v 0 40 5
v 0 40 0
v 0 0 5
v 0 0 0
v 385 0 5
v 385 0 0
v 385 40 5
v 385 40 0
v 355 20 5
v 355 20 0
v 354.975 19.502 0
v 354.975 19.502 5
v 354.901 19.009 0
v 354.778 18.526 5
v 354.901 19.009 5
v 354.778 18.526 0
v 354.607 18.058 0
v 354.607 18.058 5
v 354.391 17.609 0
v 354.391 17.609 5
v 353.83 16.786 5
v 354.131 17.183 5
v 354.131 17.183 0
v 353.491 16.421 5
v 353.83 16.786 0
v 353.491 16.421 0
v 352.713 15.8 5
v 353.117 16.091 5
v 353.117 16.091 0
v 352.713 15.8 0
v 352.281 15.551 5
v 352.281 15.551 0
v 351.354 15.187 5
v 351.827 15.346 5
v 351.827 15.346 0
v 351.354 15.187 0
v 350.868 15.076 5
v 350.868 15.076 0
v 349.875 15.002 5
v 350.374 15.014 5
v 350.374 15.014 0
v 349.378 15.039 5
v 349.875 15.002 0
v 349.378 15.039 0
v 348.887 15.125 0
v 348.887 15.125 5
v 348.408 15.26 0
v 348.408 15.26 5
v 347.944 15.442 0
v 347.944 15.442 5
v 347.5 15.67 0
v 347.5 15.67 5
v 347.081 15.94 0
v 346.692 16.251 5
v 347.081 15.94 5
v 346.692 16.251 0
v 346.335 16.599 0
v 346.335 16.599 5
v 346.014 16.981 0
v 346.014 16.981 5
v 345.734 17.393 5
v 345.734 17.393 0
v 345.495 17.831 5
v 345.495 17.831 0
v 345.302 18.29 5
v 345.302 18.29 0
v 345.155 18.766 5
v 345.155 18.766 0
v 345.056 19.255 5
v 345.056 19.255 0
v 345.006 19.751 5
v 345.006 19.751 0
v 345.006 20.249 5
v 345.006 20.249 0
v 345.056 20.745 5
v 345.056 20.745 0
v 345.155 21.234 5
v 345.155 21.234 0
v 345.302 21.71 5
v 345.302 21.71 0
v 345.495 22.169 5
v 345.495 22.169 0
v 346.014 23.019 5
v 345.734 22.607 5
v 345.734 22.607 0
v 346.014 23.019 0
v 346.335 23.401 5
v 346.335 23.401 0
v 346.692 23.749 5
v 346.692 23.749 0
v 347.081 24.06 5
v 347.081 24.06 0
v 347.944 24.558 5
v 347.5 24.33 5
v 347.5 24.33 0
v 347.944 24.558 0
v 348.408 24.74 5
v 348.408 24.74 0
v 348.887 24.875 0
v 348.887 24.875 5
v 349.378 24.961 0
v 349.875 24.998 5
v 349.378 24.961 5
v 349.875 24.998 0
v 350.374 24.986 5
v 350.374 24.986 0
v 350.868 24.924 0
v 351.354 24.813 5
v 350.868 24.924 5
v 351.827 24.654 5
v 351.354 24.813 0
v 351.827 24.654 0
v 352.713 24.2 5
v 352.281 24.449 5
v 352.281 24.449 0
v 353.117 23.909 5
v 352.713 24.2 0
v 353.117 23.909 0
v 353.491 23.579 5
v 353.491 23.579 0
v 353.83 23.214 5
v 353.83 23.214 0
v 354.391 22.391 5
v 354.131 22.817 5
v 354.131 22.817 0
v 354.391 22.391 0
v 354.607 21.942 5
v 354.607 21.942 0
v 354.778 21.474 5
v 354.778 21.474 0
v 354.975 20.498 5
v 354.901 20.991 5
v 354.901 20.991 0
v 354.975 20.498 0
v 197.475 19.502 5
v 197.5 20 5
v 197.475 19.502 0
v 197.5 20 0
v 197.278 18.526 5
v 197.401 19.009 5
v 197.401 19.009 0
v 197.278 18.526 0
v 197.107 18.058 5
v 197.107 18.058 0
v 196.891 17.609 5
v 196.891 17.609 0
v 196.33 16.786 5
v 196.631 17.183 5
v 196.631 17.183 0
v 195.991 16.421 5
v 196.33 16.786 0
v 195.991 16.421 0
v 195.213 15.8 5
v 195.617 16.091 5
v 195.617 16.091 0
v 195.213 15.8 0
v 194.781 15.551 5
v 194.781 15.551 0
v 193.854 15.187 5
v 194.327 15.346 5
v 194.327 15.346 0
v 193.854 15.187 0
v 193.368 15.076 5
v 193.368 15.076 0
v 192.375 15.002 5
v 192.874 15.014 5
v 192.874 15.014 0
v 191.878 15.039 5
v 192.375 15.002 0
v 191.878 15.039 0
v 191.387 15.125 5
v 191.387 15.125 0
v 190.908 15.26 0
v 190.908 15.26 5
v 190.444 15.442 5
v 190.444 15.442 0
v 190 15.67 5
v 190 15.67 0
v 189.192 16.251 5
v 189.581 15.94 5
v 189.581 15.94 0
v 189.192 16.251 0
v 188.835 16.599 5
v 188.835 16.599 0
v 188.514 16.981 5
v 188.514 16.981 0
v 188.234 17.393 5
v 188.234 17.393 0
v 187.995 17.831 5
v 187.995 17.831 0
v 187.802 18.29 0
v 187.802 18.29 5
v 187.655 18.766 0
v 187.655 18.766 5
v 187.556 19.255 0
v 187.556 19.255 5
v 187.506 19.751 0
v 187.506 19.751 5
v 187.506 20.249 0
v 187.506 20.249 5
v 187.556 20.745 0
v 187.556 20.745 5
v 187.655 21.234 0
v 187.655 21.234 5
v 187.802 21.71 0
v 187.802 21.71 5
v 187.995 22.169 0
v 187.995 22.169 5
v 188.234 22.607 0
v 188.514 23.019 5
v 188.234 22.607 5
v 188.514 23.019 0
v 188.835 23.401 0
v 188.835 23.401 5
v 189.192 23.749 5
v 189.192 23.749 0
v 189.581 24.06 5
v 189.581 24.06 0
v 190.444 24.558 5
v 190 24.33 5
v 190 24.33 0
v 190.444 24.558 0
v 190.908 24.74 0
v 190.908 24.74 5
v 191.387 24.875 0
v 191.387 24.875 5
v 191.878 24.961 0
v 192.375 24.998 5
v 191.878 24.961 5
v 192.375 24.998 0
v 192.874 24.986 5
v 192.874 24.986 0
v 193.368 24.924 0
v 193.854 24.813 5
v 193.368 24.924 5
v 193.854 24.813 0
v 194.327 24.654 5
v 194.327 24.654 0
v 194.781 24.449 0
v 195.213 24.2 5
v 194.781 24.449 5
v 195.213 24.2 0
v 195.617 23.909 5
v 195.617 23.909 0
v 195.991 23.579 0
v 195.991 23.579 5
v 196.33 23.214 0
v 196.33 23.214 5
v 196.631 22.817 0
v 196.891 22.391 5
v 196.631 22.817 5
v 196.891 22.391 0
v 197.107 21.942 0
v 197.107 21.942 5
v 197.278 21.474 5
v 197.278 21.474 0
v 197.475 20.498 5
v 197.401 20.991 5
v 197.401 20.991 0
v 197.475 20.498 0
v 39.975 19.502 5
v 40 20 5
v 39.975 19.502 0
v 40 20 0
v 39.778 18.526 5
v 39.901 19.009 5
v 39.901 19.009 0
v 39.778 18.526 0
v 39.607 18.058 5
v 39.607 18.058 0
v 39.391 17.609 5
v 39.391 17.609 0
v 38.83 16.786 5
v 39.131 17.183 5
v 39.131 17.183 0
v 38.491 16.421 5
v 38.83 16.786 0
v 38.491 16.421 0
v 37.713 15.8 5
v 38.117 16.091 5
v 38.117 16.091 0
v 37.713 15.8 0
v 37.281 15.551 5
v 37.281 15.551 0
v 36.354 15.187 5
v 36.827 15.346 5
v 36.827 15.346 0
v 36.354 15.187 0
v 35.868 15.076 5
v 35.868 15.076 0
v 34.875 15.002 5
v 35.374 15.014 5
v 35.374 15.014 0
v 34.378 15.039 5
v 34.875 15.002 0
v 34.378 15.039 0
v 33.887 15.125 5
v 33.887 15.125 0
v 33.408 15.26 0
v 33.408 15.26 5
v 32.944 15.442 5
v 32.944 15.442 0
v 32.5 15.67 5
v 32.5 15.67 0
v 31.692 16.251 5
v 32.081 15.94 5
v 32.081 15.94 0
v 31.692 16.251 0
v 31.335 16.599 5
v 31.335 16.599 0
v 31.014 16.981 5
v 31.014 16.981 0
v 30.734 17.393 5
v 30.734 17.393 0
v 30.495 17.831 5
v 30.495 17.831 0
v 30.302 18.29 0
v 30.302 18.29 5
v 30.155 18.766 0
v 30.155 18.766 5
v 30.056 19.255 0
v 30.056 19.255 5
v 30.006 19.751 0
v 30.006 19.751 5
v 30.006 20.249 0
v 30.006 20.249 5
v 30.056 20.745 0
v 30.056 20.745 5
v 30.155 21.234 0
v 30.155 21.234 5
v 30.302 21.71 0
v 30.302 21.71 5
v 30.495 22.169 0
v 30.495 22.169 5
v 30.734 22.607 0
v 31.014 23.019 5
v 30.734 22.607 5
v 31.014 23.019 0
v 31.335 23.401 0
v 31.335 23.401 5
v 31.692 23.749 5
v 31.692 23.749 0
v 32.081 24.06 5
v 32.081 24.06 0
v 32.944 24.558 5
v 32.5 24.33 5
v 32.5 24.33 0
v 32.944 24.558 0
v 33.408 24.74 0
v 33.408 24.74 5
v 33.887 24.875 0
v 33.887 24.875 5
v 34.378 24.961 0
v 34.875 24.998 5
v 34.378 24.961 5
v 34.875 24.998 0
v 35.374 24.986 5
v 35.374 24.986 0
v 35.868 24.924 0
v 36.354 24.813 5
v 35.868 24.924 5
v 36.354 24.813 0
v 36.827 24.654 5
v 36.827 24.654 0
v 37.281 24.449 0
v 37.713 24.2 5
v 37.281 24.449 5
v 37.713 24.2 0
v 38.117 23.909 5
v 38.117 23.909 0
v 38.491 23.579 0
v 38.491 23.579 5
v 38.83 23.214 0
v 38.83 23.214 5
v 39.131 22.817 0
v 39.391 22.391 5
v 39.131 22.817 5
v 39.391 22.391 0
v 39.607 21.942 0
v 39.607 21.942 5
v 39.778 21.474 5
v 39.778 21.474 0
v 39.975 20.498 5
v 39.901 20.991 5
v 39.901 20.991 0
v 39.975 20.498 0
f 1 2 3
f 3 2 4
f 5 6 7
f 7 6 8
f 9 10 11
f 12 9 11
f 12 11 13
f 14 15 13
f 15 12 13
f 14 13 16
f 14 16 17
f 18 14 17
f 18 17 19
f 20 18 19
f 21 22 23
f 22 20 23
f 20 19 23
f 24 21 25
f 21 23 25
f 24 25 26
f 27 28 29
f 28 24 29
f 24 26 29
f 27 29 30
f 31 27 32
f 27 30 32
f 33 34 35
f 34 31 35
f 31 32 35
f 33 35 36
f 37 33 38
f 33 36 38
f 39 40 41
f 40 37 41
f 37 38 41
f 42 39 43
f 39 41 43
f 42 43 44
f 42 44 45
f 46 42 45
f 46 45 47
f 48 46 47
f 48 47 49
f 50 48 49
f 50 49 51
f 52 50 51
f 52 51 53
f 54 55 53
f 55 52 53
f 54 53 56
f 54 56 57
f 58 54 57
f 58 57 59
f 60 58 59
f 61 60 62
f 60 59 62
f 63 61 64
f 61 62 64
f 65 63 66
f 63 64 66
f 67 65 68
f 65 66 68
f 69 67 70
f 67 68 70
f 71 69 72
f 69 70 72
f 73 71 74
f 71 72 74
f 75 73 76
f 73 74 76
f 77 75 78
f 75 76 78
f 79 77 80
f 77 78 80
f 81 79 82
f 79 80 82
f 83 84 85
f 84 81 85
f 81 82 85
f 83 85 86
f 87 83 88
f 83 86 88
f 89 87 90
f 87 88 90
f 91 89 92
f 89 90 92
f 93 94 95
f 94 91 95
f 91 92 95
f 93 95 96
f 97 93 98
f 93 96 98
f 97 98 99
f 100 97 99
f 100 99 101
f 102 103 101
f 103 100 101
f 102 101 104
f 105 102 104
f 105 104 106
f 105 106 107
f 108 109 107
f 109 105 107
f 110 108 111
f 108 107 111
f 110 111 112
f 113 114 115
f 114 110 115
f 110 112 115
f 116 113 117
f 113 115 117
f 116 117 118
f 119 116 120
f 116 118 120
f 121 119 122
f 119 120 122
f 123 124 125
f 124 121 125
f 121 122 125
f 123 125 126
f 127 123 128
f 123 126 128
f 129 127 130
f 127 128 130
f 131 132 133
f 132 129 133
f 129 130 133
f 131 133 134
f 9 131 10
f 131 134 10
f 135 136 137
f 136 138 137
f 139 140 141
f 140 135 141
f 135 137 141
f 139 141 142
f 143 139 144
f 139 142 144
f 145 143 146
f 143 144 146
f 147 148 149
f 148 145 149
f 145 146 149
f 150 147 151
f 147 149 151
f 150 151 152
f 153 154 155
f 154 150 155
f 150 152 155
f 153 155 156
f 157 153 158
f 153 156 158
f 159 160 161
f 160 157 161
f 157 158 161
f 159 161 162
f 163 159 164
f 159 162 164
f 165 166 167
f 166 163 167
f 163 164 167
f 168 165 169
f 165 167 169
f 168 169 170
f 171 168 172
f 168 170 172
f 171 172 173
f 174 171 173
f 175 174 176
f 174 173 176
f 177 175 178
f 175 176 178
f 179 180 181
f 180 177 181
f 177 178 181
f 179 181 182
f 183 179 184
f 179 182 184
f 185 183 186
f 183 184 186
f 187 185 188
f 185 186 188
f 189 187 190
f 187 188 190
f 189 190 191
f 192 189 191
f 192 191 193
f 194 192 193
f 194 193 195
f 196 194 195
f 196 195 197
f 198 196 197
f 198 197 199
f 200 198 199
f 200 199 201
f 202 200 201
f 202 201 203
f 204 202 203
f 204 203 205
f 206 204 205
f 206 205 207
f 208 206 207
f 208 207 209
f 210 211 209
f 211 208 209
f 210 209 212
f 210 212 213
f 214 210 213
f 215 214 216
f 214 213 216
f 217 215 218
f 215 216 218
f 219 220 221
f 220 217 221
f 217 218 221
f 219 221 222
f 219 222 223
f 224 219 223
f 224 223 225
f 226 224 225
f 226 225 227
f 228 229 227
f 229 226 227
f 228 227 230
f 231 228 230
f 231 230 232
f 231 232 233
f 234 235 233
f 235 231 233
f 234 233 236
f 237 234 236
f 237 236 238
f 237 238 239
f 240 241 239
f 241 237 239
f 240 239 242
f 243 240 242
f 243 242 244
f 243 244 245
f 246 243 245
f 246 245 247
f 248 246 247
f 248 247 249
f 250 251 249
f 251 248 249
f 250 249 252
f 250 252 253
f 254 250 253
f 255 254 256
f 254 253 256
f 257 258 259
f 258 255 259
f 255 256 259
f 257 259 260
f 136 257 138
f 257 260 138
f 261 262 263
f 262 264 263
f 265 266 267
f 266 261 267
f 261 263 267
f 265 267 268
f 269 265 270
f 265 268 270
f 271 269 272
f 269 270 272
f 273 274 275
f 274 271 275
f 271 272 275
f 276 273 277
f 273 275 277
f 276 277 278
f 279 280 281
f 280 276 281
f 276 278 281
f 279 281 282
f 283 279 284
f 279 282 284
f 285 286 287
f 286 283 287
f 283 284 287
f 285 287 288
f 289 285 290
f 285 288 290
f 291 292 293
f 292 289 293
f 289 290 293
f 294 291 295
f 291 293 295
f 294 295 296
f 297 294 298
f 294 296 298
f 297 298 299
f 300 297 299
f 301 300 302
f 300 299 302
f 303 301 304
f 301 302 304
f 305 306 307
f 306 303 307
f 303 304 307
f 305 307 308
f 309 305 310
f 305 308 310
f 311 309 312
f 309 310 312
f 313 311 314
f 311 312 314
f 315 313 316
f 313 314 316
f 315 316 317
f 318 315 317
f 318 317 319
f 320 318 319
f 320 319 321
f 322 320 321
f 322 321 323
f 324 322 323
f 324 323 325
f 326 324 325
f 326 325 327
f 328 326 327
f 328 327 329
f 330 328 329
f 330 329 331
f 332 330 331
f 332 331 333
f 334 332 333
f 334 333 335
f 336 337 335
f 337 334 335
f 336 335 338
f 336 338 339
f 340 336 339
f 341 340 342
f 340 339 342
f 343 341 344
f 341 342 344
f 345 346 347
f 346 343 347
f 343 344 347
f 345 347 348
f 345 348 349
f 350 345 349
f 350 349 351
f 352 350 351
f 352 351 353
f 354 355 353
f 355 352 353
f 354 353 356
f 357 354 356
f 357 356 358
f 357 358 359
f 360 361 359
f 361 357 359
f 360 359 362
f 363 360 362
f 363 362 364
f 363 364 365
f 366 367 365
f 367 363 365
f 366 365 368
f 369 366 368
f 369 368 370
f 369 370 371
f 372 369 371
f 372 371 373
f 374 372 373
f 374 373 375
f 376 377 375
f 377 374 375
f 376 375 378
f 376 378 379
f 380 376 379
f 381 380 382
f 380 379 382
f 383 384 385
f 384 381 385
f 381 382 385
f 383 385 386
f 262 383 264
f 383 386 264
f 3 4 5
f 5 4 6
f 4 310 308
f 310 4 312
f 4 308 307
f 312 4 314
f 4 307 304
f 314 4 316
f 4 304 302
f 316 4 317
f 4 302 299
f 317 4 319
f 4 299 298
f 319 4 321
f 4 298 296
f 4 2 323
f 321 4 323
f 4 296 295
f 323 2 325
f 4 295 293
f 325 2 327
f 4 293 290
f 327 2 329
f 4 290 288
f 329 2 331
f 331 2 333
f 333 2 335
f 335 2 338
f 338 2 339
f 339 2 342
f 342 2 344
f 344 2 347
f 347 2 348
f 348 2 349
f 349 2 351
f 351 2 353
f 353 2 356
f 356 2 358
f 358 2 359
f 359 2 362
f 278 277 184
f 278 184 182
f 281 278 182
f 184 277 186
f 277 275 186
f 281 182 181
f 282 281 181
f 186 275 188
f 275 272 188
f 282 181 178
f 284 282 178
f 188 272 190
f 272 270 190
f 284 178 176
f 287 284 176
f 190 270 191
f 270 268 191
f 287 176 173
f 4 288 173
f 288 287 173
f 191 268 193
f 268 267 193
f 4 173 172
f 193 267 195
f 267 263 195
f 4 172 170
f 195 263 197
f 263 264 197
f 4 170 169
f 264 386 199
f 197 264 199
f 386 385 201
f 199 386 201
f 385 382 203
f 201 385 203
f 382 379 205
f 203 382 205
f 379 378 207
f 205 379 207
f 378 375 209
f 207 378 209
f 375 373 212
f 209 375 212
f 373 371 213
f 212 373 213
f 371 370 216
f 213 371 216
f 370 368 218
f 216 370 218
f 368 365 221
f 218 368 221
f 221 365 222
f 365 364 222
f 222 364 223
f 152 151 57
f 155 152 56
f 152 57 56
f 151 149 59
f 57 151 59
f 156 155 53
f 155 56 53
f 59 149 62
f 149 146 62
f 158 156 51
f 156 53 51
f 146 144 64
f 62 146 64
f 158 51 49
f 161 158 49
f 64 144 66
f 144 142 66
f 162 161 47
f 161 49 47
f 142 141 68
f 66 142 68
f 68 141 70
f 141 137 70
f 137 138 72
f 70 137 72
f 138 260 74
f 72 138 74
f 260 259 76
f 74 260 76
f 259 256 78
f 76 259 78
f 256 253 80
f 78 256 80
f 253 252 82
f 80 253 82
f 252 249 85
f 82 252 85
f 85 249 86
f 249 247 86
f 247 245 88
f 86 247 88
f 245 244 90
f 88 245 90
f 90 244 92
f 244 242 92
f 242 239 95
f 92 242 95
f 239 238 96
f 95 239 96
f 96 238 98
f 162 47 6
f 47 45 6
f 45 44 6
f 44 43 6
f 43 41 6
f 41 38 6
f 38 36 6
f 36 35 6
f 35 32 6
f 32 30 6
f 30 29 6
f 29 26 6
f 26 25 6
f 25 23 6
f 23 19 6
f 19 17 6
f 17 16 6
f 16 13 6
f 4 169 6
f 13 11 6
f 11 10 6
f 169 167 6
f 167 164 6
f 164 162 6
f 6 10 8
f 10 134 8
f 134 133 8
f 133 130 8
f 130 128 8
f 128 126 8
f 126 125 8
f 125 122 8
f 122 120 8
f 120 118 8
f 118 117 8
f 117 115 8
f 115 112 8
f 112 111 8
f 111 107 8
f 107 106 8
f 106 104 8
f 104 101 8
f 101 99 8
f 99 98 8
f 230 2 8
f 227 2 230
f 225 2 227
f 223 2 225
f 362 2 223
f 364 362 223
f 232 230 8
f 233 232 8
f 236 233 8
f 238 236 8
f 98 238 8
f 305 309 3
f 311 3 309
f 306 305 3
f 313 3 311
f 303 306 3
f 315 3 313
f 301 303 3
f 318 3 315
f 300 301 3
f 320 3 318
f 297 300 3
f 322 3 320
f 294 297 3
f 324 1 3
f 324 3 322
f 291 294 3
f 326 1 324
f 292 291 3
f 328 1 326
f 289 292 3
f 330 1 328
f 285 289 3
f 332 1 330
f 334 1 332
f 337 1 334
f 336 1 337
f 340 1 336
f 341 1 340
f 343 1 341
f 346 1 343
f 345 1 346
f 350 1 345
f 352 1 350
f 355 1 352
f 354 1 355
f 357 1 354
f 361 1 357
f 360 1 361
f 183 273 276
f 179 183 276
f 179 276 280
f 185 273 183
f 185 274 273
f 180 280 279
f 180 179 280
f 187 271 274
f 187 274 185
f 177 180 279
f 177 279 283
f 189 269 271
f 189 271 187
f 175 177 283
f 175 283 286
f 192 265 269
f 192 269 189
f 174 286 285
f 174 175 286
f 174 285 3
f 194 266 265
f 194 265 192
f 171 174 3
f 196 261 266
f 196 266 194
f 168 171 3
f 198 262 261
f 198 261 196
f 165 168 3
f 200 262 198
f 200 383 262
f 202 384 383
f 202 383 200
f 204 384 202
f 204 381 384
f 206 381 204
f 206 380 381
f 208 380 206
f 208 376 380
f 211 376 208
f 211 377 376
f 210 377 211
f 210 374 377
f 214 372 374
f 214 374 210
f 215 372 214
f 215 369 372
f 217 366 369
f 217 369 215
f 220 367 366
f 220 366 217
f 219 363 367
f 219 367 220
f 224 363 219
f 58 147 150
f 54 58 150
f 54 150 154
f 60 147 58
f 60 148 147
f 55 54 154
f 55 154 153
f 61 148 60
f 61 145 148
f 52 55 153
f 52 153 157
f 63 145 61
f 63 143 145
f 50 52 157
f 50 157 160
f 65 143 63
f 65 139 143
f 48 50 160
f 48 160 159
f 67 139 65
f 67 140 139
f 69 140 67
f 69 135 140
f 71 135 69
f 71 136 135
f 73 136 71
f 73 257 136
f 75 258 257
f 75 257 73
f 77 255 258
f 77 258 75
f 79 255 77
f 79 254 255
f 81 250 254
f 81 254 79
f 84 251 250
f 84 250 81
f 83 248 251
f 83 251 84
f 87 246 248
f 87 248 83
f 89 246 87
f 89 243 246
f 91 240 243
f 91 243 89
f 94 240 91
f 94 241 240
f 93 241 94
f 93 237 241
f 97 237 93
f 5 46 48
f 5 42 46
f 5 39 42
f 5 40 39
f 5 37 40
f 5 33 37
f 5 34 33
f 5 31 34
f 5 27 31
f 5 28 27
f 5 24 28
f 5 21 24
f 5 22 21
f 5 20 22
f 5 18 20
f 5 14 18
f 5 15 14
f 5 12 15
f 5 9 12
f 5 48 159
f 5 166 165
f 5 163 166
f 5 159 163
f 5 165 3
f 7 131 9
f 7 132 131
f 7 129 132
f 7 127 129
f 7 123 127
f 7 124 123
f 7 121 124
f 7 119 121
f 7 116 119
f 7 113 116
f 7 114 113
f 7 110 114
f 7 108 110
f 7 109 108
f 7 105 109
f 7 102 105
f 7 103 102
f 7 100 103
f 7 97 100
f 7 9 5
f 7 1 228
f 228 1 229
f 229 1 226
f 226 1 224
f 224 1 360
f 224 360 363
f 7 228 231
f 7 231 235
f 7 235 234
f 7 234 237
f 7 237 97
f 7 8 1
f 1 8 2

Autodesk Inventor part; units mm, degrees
ref_plane "YZ Plane" through (0, 0, 0) normal (1, 0, 0) x (0, 1, 0)
ref_plane "XZ Plane" through (0, 0, 0) normal (0, 1, 0) x (-1, 0, 0)
ref_plane "XY Plane" through (0, 0, 0) normal (0, 0, 1) x (1, 0, 0)
sketch "Boceto1" plane through (0, 0, 0) normal (0, 0, 1) x (1, 0, 0)
  line L0 (0, 0) -> (385, 0)
  line L1 (385, 0) -> (385, 40)
  line L2 (385, 40) -> (0, 40)
  line L3 (0, 40) -> (0, 0)
  line L4 (0, 20) -> (385, 20) construction
  circle A0 centre (35, 20) radius 5
  circle A1 centre (192.5, 20) radius 5
  circle A2 centre (350, 20) radius 5
  dimension "d0" = 40
  dimension "d1" = 385
  dimension "d2" = 10
  dimension "d3" = 10
  dimension "d4" = 10
  dimension "d5" = 35
  dimension "d6" = 35
extrude "Extrusión1" add sketch "Boceto1" along normal blind 5
properties part number "Sup.Acrilico.Segur" material "Acrílico, claro"
